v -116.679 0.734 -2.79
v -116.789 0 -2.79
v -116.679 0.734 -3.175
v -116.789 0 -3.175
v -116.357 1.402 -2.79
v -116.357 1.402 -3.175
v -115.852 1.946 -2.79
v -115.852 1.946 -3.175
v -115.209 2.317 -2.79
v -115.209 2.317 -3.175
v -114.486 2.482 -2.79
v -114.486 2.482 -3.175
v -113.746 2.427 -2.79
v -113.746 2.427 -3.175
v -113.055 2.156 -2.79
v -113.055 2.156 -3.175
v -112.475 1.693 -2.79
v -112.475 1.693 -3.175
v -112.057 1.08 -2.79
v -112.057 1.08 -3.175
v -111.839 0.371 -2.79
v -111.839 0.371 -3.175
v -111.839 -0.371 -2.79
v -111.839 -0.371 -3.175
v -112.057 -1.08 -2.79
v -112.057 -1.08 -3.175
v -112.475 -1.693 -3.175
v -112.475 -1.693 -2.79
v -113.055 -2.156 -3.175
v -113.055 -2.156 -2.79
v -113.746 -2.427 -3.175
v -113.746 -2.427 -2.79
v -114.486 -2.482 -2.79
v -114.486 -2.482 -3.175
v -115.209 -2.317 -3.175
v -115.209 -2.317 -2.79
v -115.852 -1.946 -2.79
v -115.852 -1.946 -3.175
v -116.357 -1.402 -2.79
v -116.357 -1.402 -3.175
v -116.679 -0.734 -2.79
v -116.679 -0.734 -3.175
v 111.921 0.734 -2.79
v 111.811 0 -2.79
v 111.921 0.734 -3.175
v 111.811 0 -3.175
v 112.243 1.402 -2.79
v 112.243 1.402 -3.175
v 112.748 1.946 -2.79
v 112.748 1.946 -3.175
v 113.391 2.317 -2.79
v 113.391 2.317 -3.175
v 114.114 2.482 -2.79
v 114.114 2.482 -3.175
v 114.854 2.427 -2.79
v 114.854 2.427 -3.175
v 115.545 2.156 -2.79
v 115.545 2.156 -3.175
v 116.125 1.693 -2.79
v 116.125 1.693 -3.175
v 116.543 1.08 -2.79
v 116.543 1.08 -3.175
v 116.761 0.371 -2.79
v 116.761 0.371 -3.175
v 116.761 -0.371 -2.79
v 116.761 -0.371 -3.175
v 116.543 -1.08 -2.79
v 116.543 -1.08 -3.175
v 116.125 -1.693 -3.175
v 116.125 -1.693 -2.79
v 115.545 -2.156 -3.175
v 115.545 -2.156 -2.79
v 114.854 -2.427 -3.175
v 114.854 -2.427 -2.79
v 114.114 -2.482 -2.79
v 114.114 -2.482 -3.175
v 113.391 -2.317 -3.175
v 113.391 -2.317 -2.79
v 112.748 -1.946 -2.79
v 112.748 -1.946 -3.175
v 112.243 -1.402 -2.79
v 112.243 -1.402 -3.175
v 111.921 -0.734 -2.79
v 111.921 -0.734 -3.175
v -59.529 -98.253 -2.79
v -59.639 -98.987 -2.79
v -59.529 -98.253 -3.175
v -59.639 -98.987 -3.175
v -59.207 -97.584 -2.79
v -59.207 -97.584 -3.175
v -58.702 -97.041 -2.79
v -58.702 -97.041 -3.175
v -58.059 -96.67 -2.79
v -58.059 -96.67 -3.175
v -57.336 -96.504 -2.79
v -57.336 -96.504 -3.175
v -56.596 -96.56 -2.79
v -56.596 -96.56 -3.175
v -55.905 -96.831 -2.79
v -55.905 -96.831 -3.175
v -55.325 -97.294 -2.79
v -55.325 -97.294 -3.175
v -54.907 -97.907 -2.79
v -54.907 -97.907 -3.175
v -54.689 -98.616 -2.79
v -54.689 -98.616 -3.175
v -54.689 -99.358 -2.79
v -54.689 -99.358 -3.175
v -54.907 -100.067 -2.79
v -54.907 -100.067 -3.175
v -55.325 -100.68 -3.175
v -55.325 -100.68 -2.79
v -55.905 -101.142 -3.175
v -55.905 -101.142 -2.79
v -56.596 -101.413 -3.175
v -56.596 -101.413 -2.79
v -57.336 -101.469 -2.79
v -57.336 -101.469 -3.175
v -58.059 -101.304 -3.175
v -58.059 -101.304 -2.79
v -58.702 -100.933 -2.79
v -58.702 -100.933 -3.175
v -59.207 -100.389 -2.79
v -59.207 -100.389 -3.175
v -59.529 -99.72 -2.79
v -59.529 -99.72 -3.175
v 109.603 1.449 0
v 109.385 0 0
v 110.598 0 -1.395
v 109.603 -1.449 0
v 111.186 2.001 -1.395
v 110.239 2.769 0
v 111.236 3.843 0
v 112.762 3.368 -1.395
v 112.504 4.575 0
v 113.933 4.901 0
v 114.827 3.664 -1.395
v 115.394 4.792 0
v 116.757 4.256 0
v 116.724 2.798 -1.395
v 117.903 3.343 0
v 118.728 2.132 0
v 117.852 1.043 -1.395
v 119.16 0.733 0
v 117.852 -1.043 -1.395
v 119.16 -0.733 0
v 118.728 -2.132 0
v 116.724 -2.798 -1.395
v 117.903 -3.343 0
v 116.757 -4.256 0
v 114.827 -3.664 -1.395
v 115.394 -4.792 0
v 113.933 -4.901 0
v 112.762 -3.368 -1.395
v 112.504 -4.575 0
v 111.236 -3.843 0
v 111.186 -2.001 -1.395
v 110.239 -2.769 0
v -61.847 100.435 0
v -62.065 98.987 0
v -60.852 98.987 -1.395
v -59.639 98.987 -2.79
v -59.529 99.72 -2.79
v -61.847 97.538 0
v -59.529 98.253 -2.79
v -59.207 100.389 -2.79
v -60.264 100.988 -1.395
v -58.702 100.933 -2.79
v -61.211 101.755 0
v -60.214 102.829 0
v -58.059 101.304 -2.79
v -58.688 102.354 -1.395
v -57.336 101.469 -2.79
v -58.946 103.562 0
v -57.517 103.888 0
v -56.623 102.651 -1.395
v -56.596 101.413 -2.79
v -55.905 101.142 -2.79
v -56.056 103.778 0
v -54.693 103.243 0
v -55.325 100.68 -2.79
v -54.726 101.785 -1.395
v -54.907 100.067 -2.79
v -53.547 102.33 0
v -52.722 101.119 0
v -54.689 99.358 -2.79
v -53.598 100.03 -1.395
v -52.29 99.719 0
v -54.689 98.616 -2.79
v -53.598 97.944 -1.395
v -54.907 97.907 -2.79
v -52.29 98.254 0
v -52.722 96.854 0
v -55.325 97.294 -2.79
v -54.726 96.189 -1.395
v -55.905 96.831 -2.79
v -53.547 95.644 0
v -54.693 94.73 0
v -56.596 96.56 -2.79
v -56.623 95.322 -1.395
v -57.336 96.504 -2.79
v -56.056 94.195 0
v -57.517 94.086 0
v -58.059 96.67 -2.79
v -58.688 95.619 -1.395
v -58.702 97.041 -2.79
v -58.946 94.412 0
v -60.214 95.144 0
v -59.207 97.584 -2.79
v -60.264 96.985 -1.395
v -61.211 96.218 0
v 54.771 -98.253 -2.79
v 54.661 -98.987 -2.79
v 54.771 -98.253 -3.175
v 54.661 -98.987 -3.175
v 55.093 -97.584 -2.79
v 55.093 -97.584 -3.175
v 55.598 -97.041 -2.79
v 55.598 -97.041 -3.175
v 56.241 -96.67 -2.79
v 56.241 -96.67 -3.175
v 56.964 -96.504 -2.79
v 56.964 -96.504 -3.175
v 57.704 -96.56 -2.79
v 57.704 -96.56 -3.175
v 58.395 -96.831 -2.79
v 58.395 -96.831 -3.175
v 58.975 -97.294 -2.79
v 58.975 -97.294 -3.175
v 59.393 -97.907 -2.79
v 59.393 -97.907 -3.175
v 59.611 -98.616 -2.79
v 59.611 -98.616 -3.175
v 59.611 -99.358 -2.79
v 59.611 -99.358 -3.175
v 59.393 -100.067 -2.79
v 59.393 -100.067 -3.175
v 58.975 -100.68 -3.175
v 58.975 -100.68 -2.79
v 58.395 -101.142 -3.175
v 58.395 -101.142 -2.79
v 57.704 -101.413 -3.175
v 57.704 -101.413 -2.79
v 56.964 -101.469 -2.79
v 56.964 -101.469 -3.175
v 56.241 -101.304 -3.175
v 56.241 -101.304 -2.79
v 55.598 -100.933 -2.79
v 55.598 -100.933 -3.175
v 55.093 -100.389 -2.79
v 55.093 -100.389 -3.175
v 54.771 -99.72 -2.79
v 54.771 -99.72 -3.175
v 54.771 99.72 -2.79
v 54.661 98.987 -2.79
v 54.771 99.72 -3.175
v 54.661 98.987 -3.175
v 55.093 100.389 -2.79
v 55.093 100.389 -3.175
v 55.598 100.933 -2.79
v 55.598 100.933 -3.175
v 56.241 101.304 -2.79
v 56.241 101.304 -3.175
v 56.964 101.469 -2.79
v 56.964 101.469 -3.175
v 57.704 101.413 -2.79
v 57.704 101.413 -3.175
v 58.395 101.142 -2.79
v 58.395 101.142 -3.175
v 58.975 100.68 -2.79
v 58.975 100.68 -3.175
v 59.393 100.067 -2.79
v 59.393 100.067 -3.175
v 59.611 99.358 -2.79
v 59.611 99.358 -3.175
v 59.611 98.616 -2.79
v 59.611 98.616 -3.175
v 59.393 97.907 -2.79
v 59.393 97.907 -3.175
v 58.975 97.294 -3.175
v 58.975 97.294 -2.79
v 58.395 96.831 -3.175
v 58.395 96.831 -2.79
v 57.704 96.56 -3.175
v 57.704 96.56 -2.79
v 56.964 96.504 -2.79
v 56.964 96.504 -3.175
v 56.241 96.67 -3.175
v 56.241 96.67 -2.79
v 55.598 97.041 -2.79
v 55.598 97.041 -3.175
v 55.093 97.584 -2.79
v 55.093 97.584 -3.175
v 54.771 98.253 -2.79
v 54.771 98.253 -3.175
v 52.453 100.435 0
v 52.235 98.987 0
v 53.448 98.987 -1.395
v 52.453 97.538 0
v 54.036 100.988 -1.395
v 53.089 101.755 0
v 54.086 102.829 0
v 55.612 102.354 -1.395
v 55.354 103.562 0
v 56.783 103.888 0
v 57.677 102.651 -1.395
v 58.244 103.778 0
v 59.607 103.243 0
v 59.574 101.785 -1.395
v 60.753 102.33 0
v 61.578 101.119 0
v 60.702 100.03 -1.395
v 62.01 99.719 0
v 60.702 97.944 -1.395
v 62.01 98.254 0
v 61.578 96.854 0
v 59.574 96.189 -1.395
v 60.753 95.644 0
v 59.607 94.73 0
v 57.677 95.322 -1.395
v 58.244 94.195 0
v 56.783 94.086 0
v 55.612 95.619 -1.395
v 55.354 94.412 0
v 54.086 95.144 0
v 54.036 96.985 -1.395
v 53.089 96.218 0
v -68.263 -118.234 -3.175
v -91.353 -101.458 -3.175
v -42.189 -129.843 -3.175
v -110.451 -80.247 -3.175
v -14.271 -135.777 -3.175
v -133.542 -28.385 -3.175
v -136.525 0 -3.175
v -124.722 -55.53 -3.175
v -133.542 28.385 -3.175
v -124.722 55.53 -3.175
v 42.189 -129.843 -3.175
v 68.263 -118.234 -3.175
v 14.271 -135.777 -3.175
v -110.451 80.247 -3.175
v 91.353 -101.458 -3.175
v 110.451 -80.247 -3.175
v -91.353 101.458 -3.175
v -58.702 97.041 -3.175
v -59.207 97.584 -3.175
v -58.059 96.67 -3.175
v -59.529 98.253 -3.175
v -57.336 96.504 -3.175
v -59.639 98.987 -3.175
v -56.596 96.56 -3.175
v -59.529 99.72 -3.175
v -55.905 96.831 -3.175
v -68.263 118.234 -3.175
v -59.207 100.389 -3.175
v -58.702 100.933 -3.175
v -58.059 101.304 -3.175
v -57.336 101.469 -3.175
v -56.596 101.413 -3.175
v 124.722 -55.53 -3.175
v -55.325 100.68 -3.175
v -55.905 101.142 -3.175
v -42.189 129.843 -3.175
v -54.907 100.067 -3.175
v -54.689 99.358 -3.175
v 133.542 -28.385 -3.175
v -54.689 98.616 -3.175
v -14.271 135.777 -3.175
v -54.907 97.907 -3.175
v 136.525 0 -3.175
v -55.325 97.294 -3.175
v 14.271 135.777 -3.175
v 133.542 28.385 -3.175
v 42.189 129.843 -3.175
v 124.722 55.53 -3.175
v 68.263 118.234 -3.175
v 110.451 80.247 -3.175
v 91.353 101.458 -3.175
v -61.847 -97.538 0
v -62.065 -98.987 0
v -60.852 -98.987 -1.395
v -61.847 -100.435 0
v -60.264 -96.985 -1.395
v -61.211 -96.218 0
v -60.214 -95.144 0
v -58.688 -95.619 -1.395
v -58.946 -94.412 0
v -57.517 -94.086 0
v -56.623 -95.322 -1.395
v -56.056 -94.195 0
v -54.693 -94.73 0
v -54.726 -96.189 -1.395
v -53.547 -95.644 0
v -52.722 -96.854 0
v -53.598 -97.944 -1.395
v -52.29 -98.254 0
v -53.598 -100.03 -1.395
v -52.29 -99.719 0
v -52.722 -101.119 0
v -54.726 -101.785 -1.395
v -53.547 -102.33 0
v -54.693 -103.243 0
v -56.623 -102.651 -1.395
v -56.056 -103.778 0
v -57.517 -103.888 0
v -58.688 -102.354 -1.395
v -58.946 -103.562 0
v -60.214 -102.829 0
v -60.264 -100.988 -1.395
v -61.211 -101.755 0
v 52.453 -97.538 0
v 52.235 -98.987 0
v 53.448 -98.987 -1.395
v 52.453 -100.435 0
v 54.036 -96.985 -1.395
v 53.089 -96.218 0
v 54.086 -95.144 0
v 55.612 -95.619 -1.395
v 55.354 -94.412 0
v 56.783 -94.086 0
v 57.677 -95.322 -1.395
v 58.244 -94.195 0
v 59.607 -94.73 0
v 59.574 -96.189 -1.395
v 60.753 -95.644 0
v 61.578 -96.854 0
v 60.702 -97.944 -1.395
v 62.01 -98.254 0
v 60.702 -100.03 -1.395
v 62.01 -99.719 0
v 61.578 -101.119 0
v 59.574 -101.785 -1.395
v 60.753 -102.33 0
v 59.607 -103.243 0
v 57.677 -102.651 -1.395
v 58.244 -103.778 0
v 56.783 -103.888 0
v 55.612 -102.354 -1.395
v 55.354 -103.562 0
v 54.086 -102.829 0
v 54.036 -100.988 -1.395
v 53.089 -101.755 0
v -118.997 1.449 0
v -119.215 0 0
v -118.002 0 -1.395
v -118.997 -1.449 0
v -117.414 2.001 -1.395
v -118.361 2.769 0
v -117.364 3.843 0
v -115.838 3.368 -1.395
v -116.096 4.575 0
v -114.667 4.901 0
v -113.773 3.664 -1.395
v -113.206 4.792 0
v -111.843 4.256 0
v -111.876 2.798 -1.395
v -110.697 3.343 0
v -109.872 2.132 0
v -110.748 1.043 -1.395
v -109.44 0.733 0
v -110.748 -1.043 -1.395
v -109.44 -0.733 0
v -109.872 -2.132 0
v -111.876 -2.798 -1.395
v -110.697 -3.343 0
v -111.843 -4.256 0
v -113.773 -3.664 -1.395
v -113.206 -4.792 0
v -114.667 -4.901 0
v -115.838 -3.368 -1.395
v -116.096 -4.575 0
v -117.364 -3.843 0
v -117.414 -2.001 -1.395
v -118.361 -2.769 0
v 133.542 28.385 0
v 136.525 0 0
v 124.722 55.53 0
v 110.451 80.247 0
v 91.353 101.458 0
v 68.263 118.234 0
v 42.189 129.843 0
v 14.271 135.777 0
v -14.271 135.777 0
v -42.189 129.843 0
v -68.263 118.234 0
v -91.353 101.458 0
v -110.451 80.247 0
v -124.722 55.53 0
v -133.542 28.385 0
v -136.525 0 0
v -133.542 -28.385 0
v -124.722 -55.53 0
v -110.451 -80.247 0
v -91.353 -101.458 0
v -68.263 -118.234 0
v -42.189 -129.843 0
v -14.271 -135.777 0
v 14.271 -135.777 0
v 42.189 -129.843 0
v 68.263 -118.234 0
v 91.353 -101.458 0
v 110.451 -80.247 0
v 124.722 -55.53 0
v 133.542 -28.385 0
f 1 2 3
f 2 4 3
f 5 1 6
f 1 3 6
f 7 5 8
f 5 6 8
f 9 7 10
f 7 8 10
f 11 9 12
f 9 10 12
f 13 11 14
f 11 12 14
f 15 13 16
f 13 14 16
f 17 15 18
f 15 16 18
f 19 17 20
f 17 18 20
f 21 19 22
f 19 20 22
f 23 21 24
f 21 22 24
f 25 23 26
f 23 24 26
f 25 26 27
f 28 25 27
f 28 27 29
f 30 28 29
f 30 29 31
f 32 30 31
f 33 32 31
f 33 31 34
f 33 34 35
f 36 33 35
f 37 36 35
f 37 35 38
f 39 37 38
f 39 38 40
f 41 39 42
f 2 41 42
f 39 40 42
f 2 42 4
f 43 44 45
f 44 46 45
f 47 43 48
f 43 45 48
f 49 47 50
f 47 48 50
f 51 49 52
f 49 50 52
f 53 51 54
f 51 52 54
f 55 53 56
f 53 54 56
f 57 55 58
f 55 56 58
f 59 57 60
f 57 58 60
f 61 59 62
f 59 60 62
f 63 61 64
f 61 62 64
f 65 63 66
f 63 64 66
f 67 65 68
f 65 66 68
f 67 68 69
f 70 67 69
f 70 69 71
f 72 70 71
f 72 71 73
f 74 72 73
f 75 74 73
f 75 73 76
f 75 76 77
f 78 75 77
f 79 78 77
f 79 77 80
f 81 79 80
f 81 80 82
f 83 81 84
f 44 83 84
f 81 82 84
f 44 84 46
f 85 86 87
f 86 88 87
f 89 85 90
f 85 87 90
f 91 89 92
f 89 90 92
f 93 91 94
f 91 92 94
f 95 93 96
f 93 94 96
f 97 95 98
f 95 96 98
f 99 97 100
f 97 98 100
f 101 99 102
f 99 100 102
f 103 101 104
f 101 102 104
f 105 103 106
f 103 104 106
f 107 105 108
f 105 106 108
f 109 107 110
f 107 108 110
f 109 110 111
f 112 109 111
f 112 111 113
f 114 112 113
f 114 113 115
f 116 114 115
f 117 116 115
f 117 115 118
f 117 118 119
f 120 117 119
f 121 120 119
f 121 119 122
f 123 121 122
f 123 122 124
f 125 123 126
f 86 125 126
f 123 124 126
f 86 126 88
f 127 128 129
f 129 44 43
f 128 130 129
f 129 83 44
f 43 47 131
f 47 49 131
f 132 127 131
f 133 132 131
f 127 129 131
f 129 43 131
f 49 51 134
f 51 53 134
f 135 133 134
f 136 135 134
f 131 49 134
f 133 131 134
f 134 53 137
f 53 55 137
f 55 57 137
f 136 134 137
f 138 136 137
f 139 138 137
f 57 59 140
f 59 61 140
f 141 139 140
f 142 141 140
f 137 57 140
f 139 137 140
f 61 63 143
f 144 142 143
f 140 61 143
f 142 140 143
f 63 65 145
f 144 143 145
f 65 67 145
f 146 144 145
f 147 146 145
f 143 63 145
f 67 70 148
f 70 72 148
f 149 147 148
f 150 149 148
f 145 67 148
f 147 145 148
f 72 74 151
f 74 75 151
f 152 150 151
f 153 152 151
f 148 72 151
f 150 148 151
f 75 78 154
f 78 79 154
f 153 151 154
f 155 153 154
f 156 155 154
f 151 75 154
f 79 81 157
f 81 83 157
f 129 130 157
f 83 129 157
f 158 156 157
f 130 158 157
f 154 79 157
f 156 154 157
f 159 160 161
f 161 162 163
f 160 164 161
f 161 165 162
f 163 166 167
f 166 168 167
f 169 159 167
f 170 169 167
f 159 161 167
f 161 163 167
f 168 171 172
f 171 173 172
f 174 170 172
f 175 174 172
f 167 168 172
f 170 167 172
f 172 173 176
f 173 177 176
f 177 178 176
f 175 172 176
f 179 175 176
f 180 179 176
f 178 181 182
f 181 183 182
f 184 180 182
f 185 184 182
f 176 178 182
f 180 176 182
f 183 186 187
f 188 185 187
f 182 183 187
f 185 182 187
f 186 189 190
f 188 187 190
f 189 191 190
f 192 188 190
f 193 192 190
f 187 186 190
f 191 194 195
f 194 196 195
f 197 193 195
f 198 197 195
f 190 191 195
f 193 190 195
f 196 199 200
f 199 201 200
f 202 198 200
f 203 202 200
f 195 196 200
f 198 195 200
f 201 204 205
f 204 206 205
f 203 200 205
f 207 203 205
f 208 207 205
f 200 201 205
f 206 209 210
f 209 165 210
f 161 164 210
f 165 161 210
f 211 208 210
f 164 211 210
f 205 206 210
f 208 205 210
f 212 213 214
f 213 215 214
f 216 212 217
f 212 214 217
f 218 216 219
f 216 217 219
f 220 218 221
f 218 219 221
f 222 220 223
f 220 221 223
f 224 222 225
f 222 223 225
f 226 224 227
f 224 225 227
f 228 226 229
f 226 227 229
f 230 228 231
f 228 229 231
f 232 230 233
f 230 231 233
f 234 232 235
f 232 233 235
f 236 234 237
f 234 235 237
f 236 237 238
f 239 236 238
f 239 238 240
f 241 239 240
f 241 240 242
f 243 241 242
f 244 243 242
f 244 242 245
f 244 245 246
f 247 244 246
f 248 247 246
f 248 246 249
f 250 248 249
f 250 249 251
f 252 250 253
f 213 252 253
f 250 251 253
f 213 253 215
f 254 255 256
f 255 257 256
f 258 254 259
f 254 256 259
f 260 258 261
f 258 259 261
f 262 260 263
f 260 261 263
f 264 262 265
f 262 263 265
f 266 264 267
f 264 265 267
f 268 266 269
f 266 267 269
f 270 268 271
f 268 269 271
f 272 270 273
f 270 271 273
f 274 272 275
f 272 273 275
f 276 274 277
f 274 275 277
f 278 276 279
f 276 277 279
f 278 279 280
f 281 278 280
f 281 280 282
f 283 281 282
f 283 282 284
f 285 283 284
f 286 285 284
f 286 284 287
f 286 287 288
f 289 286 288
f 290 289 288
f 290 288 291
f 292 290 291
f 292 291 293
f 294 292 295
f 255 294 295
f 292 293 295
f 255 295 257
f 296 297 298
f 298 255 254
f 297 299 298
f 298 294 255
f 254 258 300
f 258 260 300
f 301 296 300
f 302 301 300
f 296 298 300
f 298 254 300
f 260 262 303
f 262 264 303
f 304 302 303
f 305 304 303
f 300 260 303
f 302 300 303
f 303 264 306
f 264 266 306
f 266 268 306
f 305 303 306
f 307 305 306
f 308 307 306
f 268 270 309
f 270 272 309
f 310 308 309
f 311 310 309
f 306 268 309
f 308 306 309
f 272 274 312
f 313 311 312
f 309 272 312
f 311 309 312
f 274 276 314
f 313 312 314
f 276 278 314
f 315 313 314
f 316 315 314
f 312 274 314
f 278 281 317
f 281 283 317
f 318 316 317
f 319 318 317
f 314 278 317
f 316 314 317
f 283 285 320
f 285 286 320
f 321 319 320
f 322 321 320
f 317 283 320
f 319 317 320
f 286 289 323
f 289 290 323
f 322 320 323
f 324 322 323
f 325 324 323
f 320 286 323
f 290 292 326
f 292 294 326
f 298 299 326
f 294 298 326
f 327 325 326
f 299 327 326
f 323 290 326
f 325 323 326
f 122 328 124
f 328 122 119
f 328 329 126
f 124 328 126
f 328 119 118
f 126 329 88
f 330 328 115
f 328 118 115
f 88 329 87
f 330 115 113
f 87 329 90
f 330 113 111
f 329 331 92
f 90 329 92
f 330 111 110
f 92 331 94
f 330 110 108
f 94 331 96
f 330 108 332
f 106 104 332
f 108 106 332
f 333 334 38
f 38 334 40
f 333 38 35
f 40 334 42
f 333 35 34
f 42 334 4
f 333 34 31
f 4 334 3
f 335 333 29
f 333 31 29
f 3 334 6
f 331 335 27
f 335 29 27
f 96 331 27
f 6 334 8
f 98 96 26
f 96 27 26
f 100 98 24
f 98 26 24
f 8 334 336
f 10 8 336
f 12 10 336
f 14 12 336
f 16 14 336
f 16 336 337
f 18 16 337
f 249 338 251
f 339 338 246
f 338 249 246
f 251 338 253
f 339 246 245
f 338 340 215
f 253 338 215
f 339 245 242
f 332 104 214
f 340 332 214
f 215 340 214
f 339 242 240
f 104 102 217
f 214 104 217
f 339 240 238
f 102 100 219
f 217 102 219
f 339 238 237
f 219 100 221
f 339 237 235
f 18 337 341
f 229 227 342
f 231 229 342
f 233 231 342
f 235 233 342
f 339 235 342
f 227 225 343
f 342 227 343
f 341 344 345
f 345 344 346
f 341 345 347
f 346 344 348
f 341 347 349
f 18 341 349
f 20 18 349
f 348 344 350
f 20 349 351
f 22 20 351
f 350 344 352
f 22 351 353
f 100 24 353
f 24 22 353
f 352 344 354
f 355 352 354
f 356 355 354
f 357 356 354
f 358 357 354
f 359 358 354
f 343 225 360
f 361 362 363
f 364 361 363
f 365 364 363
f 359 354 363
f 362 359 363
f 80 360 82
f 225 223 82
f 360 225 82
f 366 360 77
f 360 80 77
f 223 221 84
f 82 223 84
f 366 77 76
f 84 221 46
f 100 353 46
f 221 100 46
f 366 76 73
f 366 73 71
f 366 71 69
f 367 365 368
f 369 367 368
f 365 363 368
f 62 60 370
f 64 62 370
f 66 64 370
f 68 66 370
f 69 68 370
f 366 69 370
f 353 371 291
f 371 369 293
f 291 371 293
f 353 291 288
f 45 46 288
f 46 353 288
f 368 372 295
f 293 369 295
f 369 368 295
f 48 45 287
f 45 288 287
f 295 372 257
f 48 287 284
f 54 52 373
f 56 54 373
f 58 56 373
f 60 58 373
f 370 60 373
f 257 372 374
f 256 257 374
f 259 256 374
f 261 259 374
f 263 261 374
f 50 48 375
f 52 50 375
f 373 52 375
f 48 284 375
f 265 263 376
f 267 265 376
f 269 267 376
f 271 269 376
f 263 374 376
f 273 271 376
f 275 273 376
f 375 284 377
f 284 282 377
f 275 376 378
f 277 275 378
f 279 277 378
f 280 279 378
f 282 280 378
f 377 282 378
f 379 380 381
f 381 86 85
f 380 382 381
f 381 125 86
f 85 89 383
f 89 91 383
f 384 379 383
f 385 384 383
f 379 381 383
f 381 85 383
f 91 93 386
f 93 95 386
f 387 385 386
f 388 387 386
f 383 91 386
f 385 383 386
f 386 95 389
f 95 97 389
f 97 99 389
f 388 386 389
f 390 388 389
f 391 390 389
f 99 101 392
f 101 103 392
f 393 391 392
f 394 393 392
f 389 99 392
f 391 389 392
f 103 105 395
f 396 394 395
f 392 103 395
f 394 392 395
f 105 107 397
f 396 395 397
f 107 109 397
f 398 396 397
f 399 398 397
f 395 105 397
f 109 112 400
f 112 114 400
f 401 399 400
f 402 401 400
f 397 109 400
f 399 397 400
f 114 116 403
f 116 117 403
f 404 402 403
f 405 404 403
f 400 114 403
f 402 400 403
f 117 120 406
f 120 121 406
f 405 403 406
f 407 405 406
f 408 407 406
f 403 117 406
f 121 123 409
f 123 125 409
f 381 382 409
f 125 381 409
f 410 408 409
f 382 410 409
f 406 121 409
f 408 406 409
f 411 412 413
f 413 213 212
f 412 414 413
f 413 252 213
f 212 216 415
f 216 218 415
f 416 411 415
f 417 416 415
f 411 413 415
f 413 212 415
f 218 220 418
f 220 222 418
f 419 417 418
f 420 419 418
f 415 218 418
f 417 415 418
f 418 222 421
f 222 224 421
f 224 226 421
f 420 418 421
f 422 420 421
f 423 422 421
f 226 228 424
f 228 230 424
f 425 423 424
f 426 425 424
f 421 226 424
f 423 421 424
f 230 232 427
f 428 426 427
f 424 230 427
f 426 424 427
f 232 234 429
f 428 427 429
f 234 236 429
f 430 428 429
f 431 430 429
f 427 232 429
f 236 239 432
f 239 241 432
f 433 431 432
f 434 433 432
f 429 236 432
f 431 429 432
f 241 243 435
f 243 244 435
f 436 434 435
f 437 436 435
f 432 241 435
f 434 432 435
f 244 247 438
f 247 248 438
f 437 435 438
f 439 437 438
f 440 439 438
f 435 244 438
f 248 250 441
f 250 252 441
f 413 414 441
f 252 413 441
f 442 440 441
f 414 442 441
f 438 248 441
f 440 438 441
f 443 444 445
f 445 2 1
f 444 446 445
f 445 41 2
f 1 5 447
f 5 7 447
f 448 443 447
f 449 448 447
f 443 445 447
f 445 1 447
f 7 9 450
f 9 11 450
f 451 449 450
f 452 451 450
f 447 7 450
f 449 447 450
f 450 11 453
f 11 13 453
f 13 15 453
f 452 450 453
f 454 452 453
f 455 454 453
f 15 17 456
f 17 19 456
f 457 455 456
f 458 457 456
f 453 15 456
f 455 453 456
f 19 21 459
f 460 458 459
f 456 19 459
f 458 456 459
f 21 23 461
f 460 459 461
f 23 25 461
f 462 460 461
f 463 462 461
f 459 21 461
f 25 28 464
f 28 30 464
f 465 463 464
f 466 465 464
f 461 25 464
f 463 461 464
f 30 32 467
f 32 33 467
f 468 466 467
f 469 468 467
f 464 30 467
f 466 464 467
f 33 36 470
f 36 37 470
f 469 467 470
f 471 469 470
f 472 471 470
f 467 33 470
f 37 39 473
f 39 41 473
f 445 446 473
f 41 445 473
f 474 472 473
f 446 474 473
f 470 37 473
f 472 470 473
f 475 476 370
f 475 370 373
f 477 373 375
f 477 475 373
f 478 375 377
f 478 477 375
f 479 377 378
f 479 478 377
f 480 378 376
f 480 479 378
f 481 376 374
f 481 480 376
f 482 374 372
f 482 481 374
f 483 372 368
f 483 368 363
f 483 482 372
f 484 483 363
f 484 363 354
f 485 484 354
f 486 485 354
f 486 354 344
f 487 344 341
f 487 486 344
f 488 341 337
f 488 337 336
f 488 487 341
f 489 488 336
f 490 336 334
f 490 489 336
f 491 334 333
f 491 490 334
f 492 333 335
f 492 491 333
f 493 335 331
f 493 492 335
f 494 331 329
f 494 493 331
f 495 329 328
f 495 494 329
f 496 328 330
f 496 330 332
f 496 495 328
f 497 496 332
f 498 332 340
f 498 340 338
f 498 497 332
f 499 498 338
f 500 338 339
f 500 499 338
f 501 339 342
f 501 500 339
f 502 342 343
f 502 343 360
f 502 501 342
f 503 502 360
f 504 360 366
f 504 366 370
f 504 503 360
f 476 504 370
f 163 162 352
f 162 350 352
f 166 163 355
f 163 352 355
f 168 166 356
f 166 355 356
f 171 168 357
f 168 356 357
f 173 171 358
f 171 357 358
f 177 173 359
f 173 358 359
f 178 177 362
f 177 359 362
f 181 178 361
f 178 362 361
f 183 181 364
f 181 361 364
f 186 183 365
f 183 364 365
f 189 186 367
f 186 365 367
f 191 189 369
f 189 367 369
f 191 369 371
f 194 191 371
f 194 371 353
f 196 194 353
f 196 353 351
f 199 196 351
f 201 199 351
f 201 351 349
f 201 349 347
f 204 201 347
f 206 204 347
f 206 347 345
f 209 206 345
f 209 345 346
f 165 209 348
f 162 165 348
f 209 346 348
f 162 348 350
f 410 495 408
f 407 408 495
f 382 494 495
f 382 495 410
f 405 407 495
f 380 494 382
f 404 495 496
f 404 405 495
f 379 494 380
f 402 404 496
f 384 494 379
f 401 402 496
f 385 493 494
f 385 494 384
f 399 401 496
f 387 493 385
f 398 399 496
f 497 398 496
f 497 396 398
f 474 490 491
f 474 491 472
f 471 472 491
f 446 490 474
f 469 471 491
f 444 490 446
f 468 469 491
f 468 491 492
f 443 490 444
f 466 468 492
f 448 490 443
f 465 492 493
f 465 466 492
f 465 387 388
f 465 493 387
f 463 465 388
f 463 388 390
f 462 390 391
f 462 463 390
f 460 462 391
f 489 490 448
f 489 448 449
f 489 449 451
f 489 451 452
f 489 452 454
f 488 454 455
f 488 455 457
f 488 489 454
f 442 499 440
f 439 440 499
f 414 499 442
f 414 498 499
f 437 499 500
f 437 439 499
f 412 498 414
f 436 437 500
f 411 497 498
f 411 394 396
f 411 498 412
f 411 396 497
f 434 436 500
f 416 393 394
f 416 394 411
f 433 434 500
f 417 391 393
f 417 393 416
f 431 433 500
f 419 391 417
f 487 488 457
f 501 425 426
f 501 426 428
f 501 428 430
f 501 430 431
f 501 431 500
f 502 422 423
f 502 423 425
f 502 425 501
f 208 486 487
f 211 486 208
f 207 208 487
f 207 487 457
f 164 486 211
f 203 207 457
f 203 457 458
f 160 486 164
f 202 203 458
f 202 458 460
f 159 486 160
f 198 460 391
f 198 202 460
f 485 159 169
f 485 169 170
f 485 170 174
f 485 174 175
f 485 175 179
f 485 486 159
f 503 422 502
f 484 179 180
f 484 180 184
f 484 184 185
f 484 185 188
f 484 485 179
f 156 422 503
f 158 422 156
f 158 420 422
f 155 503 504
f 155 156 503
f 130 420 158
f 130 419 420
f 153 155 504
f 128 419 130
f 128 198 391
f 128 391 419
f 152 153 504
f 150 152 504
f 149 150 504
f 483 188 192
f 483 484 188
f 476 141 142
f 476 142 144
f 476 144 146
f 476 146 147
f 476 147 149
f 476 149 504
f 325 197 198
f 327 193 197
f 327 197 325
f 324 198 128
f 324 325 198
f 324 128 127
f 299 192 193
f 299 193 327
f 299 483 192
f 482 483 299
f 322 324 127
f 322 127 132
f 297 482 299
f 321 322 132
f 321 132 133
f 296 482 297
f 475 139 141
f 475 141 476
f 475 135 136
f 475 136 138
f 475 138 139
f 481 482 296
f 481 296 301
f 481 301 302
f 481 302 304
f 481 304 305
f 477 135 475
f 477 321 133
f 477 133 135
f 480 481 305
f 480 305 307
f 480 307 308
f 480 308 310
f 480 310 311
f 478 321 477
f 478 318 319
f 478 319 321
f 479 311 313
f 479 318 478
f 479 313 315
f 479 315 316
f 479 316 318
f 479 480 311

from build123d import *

# Parameters (mm, degrees)
F0_R           = 136.525
F1_DEPTH       = 3.175
F3_D           = 4.9784
F3_CSINK_D     = 9.8298
F3_CSINK_ANGLE = 82


with BuildPart() as f1:
    # F0 (on Top) → F1 (new body)
    with BuildSketch(Plane.XY):
        Circle(F0_R)
    extrude(amount=-F1_DEPTH)

    # F3 (through all)
    with Locations(Plane.XY):
        with Locations((-114.3, 0), (-57.15, 98.986704), (57.15, 98.986704), (114.3, 0), (57.15, -98.986704), (-57.15, -98.986704)):
            CounterSinkHole(F3_D / 2, F3_CSINK_D / 2, counter_sink_angle=F3_CSINK_ANGLE)


solid = f1.part
